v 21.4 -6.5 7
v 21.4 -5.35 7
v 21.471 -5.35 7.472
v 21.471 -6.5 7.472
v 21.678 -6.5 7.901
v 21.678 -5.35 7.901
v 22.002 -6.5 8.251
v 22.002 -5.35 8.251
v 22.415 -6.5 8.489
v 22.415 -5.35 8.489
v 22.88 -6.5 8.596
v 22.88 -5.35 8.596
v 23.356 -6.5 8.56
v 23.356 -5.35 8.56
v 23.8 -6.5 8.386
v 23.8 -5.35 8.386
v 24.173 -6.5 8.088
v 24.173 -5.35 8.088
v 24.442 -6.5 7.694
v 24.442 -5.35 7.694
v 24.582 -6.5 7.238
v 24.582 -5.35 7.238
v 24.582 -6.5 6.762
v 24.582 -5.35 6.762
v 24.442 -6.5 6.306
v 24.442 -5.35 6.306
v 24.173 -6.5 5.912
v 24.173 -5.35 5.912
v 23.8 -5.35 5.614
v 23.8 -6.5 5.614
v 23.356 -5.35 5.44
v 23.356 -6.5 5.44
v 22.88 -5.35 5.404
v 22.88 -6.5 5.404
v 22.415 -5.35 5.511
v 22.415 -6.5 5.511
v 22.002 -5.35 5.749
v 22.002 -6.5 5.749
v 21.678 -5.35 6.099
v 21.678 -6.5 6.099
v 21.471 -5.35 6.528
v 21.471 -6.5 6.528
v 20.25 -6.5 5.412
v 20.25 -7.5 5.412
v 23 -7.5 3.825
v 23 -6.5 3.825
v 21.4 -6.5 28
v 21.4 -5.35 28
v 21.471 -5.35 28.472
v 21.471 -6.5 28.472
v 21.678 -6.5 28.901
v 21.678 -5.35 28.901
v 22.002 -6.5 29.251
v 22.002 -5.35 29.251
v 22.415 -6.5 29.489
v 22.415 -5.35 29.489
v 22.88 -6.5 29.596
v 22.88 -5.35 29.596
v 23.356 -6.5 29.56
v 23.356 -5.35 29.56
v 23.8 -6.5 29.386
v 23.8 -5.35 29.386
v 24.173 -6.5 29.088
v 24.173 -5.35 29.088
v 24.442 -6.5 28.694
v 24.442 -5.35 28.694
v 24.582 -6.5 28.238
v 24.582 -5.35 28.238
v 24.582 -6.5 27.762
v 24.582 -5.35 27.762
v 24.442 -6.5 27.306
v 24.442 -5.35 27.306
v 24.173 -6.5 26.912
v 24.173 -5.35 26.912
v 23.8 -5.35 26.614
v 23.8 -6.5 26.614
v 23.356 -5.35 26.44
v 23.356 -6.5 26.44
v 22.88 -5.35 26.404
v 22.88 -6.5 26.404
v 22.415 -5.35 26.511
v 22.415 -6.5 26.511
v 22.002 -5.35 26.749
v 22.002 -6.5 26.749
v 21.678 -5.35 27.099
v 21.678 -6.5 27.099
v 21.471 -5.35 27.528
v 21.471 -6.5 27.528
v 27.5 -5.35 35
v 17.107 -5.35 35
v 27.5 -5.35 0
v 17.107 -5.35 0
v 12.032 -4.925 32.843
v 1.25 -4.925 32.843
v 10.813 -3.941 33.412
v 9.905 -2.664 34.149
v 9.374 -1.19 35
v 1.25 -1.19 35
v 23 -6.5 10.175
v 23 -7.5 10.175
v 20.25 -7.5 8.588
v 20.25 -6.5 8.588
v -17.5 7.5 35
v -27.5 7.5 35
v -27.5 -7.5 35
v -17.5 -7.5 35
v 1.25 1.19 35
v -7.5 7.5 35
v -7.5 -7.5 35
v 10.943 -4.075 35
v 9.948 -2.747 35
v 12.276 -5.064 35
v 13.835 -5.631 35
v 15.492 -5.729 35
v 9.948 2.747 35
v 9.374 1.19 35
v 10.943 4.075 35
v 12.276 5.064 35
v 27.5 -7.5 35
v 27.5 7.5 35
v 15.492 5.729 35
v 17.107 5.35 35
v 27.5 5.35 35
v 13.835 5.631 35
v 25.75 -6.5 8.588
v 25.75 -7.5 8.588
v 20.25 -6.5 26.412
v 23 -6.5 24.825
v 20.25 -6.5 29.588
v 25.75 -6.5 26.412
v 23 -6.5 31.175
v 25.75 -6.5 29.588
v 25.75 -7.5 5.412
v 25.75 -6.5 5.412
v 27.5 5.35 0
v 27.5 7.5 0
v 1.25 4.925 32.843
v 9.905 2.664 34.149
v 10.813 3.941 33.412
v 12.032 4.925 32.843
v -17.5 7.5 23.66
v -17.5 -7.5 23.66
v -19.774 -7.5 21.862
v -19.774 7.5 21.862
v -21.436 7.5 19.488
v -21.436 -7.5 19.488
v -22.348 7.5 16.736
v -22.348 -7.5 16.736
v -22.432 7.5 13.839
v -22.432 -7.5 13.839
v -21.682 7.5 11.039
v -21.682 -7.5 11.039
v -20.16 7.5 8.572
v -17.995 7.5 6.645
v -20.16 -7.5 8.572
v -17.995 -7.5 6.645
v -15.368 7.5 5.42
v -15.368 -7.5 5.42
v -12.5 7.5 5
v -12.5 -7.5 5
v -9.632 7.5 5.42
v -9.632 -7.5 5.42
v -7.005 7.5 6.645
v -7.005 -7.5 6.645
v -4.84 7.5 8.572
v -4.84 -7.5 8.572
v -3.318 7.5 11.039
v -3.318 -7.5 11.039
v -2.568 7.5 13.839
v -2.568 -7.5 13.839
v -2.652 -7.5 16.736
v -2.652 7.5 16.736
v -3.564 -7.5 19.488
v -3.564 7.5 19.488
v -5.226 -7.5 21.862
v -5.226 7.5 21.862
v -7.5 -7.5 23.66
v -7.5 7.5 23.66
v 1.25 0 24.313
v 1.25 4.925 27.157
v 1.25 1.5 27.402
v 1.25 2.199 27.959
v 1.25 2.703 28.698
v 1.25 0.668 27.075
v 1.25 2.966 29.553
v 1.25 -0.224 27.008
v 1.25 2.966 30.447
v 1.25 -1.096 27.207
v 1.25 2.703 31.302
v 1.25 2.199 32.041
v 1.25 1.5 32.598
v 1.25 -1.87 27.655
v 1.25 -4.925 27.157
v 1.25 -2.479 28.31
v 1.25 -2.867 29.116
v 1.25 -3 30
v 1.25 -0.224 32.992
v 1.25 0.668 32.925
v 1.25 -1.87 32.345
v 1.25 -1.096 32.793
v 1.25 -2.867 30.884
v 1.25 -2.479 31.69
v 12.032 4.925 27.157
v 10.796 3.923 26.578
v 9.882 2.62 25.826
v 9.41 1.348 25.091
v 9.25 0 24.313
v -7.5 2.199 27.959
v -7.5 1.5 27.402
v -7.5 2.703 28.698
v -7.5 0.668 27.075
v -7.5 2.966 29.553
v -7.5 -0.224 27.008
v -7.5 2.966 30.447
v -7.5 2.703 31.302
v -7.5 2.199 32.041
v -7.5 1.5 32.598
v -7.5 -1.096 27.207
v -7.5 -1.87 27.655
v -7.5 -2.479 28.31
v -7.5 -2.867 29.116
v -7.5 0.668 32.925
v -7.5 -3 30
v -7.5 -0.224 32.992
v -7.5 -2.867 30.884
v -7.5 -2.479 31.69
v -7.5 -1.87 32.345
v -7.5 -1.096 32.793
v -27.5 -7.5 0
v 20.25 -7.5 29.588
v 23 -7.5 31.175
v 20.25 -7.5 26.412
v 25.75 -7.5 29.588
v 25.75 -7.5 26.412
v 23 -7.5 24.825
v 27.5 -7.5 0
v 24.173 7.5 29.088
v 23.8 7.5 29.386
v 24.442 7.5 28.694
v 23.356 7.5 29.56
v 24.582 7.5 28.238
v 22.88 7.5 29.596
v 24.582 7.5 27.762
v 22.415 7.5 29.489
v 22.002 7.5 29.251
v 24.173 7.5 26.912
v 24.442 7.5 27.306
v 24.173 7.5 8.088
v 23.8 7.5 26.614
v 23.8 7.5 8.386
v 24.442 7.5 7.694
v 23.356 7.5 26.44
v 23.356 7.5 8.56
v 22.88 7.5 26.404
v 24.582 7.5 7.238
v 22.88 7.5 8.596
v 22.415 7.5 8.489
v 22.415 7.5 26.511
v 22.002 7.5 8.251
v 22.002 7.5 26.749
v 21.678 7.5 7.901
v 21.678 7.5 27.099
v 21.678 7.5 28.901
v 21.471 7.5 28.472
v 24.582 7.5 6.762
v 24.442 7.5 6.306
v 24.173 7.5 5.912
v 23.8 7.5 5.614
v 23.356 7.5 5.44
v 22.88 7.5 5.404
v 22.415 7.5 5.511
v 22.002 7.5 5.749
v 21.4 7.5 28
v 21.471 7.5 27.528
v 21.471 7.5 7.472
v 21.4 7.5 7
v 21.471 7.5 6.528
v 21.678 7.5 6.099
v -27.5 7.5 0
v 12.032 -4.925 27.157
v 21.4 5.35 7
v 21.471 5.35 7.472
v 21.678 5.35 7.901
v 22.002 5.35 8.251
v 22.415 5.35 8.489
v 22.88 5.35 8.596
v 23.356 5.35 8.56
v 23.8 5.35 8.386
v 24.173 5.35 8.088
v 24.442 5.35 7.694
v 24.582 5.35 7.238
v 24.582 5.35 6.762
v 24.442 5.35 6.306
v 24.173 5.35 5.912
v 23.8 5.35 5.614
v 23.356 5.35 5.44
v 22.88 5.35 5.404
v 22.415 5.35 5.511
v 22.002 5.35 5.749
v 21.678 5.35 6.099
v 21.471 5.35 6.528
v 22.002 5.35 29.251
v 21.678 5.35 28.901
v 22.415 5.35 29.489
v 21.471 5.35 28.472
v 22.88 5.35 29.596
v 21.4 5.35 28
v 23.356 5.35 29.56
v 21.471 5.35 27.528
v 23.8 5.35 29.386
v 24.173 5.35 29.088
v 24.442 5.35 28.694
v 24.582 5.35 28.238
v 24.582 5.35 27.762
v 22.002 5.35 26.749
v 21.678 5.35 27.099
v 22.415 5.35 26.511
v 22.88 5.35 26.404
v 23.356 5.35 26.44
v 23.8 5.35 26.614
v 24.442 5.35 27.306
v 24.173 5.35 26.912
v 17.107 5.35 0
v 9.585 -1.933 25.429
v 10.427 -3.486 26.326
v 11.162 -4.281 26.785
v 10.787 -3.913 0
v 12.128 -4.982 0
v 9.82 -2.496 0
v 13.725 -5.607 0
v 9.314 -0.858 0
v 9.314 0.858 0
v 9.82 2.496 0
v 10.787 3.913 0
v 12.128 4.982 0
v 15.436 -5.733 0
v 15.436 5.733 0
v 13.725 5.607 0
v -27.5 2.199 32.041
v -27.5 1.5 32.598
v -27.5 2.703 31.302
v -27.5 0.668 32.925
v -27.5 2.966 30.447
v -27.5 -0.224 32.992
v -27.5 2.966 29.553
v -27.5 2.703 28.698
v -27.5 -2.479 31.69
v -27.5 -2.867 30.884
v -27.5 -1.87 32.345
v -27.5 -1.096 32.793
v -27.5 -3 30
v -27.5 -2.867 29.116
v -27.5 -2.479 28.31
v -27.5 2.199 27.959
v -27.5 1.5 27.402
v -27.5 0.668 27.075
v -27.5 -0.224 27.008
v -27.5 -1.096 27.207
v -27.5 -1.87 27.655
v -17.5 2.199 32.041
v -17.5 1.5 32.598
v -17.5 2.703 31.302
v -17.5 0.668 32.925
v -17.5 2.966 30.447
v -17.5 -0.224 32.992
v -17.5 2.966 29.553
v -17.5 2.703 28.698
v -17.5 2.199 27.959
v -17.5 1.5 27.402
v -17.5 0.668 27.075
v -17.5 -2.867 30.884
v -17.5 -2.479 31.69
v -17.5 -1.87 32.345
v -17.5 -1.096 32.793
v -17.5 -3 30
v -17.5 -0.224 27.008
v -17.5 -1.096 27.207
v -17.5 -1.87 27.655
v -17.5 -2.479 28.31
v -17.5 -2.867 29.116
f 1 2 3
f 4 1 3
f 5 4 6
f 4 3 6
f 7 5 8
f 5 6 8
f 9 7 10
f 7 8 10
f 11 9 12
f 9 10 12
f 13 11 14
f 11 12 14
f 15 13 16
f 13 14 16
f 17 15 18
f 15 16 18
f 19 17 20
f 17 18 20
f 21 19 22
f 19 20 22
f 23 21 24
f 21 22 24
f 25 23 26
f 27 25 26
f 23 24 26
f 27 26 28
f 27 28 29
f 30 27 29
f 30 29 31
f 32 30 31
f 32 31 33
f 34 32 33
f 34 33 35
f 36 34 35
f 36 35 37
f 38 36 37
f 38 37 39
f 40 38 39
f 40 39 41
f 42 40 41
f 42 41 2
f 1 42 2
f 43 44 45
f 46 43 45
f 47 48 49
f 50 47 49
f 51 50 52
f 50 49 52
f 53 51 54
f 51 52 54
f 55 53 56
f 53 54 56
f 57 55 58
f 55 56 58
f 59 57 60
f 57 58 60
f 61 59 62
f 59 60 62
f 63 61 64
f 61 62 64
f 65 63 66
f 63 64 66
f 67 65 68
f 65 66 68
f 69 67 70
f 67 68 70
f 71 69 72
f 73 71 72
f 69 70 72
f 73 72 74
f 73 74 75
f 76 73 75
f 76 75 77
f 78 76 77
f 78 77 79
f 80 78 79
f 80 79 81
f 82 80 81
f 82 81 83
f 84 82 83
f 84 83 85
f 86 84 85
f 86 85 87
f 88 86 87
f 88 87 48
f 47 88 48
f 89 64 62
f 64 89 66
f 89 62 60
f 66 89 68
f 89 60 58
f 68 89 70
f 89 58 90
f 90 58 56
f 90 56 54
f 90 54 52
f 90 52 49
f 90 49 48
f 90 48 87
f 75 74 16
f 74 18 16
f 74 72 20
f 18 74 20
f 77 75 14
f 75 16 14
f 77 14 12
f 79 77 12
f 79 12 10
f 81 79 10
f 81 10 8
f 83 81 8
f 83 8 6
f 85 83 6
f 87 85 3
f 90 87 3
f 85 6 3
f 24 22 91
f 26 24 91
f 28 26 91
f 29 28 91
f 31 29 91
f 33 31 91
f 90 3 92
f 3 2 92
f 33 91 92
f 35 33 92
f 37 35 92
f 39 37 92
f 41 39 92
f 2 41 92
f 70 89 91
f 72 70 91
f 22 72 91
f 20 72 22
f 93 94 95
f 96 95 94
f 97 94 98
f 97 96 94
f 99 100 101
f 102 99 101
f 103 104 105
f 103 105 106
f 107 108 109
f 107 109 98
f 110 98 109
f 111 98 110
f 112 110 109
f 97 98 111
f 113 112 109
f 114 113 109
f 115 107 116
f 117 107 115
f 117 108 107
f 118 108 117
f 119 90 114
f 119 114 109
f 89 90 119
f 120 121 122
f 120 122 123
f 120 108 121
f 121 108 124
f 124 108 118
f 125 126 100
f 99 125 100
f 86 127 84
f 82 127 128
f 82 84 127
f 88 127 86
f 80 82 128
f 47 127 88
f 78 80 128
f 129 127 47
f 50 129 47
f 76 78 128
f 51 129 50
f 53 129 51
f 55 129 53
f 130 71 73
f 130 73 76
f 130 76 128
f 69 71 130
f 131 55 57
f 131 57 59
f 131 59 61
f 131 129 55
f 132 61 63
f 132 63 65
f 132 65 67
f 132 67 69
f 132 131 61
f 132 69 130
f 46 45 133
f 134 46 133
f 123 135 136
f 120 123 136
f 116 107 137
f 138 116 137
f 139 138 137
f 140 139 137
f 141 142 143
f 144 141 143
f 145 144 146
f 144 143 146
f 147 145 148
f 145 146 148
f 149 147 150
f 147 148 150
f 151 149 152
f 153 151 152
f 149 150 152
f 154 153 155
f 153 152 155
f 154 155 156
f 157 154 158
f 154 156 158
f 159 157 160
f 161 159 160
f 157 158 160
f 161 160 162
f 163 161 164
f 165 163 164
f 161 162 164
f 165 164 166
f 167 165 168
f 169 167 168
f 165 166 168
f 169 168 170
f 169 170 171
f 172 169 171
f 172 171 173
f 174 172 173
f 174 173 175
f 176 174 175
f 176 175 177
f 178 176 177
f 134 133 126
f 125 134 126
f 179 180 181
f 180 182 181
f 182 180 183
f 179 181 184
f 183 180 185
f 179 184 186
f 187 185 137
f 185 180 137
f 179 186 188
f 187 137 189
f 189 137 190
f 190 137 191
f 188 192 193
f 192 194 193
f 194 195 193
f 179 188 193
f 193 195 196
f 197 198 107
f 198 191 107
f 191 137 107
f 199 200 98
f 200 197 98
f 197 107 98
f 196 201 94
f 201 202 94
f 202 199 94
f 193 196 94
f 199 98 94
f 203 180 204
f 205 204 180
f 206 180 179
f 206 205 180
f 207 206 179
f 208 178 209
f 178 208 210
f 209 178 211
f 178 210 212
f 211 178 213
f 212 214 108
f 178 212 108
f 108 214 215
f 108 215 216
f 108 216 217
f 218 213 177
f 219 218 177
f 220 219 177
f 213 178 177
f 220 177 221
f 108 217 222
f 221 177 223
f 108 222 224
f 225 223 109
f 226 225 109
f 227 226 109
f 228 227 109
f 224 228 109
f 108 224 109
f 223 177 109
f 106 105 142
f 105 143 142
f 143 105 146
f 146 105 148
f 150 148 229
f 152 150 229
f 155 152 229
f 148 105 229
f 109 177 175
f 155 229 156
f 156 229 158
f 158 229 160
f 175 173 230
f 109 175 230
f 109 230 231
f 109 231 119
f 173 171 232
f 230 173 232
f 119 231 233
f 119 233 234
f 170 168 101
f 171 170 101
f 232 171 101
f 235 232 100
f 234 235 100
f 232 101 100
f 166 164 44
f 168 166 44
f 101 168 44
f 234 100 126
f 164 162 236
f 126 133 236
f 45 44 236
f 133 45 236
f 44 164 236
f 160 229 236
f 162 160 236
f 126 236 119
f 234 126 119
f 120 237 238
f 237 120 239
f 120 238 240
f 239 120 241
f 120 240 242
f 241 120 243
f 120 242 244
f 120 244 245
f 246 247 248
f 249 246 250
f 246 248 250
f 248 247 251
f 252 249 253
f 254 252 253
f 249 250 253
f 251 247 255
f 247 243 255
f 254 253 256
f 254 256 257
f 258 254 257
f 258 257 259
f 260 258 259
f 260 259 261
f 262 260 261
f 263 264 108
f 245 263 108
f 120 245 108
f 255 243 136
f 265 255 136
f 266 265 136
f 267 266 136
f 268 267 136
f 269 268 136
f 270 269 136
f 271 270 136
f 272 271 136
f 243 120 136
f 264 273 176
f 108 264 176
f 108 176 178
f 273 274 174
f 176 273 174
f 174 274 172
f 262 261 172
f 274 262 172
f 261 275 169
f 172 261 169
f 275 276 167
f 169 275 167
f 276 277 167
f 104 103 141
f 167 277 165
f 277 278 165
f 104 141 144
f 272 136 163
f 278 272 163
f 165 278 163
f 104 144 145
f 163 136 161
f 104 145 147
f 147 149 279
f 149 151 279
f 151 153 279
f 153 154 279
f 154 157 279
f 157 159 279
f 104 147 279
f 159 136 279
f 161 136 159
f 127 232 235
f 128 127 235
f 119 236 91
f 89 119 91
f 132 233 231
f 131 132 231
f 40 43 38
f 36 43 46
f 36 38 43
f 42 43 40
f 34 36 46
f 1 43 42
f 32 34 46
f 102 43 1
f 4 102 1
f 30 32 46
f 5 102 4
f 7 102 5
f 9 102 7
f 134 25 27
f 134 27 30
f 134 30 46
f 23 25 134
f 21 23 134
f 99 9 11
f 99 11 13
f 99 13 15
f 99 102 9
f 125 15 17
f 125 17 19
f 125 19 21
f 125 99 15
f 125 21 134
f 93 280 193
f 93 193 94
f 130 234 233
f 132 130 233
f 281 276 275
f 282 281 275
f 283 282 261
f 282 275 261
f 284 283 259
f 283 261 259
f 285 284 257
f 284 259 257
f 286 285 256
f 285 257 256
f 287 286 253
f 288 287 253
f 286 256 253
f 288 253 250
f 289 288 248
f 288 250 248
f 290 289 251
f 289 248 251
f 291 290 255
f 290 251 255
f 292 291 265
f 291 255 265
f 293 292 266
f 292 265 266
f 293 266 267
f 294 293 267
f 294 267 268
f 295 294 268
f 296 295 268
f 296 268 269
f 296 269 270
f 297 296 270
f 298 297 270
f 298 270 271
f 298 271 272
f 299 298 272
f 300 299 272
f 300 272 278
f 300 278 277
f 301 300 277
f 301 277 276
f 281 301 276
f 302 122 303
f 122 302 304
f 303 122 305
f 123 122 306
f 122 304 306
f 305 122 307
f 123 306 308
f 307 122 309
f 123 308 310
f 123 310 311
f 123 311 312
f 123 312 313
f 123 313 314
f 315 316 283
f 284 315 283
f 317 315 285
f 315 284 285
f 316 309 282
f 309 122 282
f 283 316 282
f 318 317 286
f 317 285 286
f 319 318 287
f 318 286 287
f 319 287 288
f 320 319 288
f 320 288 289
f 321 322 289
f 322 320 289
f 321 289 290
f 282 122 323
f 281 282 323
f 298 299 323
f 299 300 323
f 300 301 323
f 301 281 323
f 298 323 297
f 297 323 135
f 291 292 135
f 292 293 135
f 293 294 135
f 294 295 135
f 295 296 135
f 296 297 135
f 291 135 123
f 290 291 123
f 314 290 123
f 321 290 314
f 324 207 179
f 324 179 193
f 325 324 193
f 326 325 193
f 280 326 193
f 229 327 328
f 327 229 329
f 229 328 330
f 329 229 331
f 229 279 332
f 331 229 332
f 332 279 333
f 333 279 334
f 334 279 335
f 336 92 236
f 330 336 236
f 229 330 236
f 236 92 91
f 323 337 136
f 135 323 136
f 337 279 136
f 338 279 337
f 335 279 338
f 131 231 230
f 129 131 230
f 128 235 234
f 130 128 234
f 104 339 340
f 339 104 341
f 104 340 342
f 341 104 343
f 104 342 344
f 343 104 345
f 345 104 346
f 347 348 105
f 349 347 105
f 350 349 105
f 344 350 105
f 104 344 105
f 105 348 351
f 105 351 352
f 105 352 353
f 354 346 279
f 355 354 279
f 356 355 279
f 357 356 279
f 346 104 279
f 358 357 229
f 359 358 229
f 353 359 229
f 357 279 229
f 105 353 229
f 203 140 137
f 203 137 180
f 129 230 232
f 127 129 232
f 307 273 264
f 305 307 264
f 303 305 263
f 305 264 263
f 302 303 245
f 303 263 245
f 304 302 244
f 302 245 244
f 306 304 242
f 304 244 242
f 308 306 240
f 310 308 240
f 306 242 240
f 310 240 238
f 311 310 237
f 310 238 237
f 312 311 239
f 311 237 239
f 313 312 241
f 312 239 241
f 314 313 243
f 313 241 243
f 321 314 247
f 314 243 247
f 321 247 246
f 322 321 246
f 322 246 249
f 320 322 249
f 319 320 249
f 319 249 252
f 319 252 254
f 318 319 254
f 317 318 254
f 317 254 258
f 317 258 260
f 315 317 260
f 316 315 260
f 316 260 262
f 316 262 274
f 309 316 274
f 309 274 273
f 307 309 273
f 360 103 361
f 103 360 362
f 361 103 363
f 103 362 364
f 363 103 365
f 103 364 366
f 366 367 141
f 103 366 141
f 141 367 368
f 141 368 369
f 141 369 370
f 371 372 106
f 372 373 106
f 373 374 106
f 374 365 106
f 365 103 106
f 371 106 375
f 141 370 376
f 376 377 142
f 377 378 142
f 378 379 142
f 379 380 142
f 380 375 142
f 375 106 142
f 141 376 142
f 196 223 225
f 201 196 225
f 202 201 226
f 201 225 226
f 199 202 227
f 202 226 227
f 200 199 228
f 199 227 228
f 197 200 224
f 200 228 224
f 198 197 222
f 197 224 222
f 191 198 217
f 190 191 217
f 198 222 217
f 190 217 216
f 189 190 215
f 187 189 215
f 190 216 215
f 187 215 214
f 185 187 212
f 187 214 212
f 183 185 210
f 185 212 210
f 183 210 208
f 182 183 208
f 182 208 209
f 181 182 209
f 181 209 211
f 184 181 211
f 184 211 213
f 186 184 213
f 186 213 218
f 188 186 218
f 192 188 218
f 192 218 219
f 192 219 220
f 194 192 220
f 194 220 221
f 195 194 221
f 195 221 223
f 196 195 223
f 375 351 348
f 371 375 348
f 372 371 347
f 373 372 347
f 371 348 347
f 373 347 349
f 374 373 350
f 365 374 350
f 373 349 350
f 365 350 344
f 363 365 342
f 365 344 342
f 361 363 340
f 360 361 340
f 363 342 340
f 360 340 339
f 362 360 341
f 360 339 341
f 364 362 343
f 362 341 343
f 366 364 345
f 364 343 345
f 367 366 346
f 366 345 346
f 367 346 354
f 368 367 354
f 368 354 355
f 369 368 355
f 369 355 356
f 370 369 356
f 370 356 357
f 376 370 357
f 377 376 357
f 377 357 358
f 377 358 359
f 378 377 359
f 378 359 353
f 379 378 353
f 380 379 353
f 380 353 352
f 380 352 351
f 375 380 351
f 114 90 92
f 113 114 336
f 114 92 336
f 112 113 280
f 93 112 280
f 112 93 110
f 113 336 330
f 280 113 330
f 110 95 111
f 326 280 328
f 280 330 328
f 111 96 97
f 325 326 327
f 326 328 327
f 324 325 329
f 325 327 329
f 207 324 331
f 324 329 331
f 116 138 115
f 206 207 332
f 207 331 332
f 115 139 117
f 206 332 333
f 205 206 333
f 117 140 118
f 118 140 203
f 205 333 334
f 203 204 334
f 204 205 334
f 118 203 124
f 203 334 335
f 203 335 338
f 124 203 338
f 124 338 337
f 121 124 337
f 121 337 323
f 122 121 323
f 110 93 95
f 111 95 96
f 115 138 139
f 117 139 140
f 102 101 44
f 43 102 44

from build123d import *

# Parameters (mm, degrees)
F1_DEPTH  = 35
F3_DEPTH  = 15
F4_D      = 3.2
F5_DEPTH  = 1
F6_R      = 3
F7_DEPTH  = 55.001
F13_DEPTH = 11


with BuildPart() as f1:
    # F0 (on Top) → F1 (new body)
    with BuildSketch(Plane.XY):
        with BuildLine():
            Line((27.5, 5.35), (27.5, 7.5))
            Line((27.5, 7.5), (-27.5, 7.5))
            Line((-27.5, 7.5), (-27.5, -7.5))
            Line((-27.5, -7.5), (27.5, -7.5))
            Line((27.5, -7.5), (27.5, -5.35))
            Line((27.5, -5.35), (17.1071307506, -5.35))
            ThreePointArc((17.1071307506, -5.35), (9.25, 0), (17.1071307506, 5.35))
            Line((17.1071307506, 5.35), (27.5, 5.35))
        make_face()
    extrude(amount=F1_DEPTH)

    # F2 (on face) → F3 (cut, through all)
    with BuildSketch(Plane.XZ.offset(7.5)):
        with BuildLine():
            Line((-17.5, 35), (-17.5, 23.6602540378))
            ThreePointArc((-17.5, 23.6602540378), (-12.5, 5), (-7.5, 23.6602540378))
            Line((-7.5, 23.6602540378), (-7.5, 35))
            Line((-7.5, 35), (-17.5, 35))
        make_face()
    extrude(amount=-F3_DEPTH, mode=Mode.SUBTRACT)

    # F4 (through all)
    with Locations(Plane.XZ.offset(7.5)):
        with Locations((23, 28), (23, 7)):
            Hole(F4_D / 2)

    # F2 (on face) → F5 (cut)
    with BuildSketch(Plane.XZ.offset(7.5)):
        Polygon((25.75, 29.5877132403), (23, 31.1754264805), (20.25, 29.5877132403), (20.25, 26.4122867597), (23, 24.8245735195), (25.75, 26.4122867597), align=None)
        Polygon((25.75, 8.5877132403), (23, 10.1754264805), (20.25, 8.5877132403), (20.25, 5.4122867597), (23, 3.8245735195), (25.75, 5.4122867597), align=None)
    extrude(amount=-F5_DEPTH, mode=Mode.SUBTRACT)

    # F6 (on face) → F7 (cut, through all)
    with BuildSketch(Plane(origin=(-27.5, 0, 0), x_dir=(0, -1, 0), z_dir=(-1, 0, 0))):
        with Locations((0, 30)):
            Circle(F6_R)
    extrude(amount=-F7_DEPTH, mode=Mode.SUBTRACT)

    # F12 (on offset) → F13 (cut)
    with BuildSketch(Plane(origin=(12.25, 0, 0), x_dir=(0, -1, 0), z_dir=(-1, 0, 0))):
        Polygon((0, 35.6869001515), (-4.925, 32.8434500758), (-4.925, 27.1565499242), (0, 24.3130998485), (4.925, 27.1565499242), (4.925, 32.8434500758), align=None)
    extrude(amount=F13_DEPTH, mode=Mode.SUBTRACT)


solid = f1.part
